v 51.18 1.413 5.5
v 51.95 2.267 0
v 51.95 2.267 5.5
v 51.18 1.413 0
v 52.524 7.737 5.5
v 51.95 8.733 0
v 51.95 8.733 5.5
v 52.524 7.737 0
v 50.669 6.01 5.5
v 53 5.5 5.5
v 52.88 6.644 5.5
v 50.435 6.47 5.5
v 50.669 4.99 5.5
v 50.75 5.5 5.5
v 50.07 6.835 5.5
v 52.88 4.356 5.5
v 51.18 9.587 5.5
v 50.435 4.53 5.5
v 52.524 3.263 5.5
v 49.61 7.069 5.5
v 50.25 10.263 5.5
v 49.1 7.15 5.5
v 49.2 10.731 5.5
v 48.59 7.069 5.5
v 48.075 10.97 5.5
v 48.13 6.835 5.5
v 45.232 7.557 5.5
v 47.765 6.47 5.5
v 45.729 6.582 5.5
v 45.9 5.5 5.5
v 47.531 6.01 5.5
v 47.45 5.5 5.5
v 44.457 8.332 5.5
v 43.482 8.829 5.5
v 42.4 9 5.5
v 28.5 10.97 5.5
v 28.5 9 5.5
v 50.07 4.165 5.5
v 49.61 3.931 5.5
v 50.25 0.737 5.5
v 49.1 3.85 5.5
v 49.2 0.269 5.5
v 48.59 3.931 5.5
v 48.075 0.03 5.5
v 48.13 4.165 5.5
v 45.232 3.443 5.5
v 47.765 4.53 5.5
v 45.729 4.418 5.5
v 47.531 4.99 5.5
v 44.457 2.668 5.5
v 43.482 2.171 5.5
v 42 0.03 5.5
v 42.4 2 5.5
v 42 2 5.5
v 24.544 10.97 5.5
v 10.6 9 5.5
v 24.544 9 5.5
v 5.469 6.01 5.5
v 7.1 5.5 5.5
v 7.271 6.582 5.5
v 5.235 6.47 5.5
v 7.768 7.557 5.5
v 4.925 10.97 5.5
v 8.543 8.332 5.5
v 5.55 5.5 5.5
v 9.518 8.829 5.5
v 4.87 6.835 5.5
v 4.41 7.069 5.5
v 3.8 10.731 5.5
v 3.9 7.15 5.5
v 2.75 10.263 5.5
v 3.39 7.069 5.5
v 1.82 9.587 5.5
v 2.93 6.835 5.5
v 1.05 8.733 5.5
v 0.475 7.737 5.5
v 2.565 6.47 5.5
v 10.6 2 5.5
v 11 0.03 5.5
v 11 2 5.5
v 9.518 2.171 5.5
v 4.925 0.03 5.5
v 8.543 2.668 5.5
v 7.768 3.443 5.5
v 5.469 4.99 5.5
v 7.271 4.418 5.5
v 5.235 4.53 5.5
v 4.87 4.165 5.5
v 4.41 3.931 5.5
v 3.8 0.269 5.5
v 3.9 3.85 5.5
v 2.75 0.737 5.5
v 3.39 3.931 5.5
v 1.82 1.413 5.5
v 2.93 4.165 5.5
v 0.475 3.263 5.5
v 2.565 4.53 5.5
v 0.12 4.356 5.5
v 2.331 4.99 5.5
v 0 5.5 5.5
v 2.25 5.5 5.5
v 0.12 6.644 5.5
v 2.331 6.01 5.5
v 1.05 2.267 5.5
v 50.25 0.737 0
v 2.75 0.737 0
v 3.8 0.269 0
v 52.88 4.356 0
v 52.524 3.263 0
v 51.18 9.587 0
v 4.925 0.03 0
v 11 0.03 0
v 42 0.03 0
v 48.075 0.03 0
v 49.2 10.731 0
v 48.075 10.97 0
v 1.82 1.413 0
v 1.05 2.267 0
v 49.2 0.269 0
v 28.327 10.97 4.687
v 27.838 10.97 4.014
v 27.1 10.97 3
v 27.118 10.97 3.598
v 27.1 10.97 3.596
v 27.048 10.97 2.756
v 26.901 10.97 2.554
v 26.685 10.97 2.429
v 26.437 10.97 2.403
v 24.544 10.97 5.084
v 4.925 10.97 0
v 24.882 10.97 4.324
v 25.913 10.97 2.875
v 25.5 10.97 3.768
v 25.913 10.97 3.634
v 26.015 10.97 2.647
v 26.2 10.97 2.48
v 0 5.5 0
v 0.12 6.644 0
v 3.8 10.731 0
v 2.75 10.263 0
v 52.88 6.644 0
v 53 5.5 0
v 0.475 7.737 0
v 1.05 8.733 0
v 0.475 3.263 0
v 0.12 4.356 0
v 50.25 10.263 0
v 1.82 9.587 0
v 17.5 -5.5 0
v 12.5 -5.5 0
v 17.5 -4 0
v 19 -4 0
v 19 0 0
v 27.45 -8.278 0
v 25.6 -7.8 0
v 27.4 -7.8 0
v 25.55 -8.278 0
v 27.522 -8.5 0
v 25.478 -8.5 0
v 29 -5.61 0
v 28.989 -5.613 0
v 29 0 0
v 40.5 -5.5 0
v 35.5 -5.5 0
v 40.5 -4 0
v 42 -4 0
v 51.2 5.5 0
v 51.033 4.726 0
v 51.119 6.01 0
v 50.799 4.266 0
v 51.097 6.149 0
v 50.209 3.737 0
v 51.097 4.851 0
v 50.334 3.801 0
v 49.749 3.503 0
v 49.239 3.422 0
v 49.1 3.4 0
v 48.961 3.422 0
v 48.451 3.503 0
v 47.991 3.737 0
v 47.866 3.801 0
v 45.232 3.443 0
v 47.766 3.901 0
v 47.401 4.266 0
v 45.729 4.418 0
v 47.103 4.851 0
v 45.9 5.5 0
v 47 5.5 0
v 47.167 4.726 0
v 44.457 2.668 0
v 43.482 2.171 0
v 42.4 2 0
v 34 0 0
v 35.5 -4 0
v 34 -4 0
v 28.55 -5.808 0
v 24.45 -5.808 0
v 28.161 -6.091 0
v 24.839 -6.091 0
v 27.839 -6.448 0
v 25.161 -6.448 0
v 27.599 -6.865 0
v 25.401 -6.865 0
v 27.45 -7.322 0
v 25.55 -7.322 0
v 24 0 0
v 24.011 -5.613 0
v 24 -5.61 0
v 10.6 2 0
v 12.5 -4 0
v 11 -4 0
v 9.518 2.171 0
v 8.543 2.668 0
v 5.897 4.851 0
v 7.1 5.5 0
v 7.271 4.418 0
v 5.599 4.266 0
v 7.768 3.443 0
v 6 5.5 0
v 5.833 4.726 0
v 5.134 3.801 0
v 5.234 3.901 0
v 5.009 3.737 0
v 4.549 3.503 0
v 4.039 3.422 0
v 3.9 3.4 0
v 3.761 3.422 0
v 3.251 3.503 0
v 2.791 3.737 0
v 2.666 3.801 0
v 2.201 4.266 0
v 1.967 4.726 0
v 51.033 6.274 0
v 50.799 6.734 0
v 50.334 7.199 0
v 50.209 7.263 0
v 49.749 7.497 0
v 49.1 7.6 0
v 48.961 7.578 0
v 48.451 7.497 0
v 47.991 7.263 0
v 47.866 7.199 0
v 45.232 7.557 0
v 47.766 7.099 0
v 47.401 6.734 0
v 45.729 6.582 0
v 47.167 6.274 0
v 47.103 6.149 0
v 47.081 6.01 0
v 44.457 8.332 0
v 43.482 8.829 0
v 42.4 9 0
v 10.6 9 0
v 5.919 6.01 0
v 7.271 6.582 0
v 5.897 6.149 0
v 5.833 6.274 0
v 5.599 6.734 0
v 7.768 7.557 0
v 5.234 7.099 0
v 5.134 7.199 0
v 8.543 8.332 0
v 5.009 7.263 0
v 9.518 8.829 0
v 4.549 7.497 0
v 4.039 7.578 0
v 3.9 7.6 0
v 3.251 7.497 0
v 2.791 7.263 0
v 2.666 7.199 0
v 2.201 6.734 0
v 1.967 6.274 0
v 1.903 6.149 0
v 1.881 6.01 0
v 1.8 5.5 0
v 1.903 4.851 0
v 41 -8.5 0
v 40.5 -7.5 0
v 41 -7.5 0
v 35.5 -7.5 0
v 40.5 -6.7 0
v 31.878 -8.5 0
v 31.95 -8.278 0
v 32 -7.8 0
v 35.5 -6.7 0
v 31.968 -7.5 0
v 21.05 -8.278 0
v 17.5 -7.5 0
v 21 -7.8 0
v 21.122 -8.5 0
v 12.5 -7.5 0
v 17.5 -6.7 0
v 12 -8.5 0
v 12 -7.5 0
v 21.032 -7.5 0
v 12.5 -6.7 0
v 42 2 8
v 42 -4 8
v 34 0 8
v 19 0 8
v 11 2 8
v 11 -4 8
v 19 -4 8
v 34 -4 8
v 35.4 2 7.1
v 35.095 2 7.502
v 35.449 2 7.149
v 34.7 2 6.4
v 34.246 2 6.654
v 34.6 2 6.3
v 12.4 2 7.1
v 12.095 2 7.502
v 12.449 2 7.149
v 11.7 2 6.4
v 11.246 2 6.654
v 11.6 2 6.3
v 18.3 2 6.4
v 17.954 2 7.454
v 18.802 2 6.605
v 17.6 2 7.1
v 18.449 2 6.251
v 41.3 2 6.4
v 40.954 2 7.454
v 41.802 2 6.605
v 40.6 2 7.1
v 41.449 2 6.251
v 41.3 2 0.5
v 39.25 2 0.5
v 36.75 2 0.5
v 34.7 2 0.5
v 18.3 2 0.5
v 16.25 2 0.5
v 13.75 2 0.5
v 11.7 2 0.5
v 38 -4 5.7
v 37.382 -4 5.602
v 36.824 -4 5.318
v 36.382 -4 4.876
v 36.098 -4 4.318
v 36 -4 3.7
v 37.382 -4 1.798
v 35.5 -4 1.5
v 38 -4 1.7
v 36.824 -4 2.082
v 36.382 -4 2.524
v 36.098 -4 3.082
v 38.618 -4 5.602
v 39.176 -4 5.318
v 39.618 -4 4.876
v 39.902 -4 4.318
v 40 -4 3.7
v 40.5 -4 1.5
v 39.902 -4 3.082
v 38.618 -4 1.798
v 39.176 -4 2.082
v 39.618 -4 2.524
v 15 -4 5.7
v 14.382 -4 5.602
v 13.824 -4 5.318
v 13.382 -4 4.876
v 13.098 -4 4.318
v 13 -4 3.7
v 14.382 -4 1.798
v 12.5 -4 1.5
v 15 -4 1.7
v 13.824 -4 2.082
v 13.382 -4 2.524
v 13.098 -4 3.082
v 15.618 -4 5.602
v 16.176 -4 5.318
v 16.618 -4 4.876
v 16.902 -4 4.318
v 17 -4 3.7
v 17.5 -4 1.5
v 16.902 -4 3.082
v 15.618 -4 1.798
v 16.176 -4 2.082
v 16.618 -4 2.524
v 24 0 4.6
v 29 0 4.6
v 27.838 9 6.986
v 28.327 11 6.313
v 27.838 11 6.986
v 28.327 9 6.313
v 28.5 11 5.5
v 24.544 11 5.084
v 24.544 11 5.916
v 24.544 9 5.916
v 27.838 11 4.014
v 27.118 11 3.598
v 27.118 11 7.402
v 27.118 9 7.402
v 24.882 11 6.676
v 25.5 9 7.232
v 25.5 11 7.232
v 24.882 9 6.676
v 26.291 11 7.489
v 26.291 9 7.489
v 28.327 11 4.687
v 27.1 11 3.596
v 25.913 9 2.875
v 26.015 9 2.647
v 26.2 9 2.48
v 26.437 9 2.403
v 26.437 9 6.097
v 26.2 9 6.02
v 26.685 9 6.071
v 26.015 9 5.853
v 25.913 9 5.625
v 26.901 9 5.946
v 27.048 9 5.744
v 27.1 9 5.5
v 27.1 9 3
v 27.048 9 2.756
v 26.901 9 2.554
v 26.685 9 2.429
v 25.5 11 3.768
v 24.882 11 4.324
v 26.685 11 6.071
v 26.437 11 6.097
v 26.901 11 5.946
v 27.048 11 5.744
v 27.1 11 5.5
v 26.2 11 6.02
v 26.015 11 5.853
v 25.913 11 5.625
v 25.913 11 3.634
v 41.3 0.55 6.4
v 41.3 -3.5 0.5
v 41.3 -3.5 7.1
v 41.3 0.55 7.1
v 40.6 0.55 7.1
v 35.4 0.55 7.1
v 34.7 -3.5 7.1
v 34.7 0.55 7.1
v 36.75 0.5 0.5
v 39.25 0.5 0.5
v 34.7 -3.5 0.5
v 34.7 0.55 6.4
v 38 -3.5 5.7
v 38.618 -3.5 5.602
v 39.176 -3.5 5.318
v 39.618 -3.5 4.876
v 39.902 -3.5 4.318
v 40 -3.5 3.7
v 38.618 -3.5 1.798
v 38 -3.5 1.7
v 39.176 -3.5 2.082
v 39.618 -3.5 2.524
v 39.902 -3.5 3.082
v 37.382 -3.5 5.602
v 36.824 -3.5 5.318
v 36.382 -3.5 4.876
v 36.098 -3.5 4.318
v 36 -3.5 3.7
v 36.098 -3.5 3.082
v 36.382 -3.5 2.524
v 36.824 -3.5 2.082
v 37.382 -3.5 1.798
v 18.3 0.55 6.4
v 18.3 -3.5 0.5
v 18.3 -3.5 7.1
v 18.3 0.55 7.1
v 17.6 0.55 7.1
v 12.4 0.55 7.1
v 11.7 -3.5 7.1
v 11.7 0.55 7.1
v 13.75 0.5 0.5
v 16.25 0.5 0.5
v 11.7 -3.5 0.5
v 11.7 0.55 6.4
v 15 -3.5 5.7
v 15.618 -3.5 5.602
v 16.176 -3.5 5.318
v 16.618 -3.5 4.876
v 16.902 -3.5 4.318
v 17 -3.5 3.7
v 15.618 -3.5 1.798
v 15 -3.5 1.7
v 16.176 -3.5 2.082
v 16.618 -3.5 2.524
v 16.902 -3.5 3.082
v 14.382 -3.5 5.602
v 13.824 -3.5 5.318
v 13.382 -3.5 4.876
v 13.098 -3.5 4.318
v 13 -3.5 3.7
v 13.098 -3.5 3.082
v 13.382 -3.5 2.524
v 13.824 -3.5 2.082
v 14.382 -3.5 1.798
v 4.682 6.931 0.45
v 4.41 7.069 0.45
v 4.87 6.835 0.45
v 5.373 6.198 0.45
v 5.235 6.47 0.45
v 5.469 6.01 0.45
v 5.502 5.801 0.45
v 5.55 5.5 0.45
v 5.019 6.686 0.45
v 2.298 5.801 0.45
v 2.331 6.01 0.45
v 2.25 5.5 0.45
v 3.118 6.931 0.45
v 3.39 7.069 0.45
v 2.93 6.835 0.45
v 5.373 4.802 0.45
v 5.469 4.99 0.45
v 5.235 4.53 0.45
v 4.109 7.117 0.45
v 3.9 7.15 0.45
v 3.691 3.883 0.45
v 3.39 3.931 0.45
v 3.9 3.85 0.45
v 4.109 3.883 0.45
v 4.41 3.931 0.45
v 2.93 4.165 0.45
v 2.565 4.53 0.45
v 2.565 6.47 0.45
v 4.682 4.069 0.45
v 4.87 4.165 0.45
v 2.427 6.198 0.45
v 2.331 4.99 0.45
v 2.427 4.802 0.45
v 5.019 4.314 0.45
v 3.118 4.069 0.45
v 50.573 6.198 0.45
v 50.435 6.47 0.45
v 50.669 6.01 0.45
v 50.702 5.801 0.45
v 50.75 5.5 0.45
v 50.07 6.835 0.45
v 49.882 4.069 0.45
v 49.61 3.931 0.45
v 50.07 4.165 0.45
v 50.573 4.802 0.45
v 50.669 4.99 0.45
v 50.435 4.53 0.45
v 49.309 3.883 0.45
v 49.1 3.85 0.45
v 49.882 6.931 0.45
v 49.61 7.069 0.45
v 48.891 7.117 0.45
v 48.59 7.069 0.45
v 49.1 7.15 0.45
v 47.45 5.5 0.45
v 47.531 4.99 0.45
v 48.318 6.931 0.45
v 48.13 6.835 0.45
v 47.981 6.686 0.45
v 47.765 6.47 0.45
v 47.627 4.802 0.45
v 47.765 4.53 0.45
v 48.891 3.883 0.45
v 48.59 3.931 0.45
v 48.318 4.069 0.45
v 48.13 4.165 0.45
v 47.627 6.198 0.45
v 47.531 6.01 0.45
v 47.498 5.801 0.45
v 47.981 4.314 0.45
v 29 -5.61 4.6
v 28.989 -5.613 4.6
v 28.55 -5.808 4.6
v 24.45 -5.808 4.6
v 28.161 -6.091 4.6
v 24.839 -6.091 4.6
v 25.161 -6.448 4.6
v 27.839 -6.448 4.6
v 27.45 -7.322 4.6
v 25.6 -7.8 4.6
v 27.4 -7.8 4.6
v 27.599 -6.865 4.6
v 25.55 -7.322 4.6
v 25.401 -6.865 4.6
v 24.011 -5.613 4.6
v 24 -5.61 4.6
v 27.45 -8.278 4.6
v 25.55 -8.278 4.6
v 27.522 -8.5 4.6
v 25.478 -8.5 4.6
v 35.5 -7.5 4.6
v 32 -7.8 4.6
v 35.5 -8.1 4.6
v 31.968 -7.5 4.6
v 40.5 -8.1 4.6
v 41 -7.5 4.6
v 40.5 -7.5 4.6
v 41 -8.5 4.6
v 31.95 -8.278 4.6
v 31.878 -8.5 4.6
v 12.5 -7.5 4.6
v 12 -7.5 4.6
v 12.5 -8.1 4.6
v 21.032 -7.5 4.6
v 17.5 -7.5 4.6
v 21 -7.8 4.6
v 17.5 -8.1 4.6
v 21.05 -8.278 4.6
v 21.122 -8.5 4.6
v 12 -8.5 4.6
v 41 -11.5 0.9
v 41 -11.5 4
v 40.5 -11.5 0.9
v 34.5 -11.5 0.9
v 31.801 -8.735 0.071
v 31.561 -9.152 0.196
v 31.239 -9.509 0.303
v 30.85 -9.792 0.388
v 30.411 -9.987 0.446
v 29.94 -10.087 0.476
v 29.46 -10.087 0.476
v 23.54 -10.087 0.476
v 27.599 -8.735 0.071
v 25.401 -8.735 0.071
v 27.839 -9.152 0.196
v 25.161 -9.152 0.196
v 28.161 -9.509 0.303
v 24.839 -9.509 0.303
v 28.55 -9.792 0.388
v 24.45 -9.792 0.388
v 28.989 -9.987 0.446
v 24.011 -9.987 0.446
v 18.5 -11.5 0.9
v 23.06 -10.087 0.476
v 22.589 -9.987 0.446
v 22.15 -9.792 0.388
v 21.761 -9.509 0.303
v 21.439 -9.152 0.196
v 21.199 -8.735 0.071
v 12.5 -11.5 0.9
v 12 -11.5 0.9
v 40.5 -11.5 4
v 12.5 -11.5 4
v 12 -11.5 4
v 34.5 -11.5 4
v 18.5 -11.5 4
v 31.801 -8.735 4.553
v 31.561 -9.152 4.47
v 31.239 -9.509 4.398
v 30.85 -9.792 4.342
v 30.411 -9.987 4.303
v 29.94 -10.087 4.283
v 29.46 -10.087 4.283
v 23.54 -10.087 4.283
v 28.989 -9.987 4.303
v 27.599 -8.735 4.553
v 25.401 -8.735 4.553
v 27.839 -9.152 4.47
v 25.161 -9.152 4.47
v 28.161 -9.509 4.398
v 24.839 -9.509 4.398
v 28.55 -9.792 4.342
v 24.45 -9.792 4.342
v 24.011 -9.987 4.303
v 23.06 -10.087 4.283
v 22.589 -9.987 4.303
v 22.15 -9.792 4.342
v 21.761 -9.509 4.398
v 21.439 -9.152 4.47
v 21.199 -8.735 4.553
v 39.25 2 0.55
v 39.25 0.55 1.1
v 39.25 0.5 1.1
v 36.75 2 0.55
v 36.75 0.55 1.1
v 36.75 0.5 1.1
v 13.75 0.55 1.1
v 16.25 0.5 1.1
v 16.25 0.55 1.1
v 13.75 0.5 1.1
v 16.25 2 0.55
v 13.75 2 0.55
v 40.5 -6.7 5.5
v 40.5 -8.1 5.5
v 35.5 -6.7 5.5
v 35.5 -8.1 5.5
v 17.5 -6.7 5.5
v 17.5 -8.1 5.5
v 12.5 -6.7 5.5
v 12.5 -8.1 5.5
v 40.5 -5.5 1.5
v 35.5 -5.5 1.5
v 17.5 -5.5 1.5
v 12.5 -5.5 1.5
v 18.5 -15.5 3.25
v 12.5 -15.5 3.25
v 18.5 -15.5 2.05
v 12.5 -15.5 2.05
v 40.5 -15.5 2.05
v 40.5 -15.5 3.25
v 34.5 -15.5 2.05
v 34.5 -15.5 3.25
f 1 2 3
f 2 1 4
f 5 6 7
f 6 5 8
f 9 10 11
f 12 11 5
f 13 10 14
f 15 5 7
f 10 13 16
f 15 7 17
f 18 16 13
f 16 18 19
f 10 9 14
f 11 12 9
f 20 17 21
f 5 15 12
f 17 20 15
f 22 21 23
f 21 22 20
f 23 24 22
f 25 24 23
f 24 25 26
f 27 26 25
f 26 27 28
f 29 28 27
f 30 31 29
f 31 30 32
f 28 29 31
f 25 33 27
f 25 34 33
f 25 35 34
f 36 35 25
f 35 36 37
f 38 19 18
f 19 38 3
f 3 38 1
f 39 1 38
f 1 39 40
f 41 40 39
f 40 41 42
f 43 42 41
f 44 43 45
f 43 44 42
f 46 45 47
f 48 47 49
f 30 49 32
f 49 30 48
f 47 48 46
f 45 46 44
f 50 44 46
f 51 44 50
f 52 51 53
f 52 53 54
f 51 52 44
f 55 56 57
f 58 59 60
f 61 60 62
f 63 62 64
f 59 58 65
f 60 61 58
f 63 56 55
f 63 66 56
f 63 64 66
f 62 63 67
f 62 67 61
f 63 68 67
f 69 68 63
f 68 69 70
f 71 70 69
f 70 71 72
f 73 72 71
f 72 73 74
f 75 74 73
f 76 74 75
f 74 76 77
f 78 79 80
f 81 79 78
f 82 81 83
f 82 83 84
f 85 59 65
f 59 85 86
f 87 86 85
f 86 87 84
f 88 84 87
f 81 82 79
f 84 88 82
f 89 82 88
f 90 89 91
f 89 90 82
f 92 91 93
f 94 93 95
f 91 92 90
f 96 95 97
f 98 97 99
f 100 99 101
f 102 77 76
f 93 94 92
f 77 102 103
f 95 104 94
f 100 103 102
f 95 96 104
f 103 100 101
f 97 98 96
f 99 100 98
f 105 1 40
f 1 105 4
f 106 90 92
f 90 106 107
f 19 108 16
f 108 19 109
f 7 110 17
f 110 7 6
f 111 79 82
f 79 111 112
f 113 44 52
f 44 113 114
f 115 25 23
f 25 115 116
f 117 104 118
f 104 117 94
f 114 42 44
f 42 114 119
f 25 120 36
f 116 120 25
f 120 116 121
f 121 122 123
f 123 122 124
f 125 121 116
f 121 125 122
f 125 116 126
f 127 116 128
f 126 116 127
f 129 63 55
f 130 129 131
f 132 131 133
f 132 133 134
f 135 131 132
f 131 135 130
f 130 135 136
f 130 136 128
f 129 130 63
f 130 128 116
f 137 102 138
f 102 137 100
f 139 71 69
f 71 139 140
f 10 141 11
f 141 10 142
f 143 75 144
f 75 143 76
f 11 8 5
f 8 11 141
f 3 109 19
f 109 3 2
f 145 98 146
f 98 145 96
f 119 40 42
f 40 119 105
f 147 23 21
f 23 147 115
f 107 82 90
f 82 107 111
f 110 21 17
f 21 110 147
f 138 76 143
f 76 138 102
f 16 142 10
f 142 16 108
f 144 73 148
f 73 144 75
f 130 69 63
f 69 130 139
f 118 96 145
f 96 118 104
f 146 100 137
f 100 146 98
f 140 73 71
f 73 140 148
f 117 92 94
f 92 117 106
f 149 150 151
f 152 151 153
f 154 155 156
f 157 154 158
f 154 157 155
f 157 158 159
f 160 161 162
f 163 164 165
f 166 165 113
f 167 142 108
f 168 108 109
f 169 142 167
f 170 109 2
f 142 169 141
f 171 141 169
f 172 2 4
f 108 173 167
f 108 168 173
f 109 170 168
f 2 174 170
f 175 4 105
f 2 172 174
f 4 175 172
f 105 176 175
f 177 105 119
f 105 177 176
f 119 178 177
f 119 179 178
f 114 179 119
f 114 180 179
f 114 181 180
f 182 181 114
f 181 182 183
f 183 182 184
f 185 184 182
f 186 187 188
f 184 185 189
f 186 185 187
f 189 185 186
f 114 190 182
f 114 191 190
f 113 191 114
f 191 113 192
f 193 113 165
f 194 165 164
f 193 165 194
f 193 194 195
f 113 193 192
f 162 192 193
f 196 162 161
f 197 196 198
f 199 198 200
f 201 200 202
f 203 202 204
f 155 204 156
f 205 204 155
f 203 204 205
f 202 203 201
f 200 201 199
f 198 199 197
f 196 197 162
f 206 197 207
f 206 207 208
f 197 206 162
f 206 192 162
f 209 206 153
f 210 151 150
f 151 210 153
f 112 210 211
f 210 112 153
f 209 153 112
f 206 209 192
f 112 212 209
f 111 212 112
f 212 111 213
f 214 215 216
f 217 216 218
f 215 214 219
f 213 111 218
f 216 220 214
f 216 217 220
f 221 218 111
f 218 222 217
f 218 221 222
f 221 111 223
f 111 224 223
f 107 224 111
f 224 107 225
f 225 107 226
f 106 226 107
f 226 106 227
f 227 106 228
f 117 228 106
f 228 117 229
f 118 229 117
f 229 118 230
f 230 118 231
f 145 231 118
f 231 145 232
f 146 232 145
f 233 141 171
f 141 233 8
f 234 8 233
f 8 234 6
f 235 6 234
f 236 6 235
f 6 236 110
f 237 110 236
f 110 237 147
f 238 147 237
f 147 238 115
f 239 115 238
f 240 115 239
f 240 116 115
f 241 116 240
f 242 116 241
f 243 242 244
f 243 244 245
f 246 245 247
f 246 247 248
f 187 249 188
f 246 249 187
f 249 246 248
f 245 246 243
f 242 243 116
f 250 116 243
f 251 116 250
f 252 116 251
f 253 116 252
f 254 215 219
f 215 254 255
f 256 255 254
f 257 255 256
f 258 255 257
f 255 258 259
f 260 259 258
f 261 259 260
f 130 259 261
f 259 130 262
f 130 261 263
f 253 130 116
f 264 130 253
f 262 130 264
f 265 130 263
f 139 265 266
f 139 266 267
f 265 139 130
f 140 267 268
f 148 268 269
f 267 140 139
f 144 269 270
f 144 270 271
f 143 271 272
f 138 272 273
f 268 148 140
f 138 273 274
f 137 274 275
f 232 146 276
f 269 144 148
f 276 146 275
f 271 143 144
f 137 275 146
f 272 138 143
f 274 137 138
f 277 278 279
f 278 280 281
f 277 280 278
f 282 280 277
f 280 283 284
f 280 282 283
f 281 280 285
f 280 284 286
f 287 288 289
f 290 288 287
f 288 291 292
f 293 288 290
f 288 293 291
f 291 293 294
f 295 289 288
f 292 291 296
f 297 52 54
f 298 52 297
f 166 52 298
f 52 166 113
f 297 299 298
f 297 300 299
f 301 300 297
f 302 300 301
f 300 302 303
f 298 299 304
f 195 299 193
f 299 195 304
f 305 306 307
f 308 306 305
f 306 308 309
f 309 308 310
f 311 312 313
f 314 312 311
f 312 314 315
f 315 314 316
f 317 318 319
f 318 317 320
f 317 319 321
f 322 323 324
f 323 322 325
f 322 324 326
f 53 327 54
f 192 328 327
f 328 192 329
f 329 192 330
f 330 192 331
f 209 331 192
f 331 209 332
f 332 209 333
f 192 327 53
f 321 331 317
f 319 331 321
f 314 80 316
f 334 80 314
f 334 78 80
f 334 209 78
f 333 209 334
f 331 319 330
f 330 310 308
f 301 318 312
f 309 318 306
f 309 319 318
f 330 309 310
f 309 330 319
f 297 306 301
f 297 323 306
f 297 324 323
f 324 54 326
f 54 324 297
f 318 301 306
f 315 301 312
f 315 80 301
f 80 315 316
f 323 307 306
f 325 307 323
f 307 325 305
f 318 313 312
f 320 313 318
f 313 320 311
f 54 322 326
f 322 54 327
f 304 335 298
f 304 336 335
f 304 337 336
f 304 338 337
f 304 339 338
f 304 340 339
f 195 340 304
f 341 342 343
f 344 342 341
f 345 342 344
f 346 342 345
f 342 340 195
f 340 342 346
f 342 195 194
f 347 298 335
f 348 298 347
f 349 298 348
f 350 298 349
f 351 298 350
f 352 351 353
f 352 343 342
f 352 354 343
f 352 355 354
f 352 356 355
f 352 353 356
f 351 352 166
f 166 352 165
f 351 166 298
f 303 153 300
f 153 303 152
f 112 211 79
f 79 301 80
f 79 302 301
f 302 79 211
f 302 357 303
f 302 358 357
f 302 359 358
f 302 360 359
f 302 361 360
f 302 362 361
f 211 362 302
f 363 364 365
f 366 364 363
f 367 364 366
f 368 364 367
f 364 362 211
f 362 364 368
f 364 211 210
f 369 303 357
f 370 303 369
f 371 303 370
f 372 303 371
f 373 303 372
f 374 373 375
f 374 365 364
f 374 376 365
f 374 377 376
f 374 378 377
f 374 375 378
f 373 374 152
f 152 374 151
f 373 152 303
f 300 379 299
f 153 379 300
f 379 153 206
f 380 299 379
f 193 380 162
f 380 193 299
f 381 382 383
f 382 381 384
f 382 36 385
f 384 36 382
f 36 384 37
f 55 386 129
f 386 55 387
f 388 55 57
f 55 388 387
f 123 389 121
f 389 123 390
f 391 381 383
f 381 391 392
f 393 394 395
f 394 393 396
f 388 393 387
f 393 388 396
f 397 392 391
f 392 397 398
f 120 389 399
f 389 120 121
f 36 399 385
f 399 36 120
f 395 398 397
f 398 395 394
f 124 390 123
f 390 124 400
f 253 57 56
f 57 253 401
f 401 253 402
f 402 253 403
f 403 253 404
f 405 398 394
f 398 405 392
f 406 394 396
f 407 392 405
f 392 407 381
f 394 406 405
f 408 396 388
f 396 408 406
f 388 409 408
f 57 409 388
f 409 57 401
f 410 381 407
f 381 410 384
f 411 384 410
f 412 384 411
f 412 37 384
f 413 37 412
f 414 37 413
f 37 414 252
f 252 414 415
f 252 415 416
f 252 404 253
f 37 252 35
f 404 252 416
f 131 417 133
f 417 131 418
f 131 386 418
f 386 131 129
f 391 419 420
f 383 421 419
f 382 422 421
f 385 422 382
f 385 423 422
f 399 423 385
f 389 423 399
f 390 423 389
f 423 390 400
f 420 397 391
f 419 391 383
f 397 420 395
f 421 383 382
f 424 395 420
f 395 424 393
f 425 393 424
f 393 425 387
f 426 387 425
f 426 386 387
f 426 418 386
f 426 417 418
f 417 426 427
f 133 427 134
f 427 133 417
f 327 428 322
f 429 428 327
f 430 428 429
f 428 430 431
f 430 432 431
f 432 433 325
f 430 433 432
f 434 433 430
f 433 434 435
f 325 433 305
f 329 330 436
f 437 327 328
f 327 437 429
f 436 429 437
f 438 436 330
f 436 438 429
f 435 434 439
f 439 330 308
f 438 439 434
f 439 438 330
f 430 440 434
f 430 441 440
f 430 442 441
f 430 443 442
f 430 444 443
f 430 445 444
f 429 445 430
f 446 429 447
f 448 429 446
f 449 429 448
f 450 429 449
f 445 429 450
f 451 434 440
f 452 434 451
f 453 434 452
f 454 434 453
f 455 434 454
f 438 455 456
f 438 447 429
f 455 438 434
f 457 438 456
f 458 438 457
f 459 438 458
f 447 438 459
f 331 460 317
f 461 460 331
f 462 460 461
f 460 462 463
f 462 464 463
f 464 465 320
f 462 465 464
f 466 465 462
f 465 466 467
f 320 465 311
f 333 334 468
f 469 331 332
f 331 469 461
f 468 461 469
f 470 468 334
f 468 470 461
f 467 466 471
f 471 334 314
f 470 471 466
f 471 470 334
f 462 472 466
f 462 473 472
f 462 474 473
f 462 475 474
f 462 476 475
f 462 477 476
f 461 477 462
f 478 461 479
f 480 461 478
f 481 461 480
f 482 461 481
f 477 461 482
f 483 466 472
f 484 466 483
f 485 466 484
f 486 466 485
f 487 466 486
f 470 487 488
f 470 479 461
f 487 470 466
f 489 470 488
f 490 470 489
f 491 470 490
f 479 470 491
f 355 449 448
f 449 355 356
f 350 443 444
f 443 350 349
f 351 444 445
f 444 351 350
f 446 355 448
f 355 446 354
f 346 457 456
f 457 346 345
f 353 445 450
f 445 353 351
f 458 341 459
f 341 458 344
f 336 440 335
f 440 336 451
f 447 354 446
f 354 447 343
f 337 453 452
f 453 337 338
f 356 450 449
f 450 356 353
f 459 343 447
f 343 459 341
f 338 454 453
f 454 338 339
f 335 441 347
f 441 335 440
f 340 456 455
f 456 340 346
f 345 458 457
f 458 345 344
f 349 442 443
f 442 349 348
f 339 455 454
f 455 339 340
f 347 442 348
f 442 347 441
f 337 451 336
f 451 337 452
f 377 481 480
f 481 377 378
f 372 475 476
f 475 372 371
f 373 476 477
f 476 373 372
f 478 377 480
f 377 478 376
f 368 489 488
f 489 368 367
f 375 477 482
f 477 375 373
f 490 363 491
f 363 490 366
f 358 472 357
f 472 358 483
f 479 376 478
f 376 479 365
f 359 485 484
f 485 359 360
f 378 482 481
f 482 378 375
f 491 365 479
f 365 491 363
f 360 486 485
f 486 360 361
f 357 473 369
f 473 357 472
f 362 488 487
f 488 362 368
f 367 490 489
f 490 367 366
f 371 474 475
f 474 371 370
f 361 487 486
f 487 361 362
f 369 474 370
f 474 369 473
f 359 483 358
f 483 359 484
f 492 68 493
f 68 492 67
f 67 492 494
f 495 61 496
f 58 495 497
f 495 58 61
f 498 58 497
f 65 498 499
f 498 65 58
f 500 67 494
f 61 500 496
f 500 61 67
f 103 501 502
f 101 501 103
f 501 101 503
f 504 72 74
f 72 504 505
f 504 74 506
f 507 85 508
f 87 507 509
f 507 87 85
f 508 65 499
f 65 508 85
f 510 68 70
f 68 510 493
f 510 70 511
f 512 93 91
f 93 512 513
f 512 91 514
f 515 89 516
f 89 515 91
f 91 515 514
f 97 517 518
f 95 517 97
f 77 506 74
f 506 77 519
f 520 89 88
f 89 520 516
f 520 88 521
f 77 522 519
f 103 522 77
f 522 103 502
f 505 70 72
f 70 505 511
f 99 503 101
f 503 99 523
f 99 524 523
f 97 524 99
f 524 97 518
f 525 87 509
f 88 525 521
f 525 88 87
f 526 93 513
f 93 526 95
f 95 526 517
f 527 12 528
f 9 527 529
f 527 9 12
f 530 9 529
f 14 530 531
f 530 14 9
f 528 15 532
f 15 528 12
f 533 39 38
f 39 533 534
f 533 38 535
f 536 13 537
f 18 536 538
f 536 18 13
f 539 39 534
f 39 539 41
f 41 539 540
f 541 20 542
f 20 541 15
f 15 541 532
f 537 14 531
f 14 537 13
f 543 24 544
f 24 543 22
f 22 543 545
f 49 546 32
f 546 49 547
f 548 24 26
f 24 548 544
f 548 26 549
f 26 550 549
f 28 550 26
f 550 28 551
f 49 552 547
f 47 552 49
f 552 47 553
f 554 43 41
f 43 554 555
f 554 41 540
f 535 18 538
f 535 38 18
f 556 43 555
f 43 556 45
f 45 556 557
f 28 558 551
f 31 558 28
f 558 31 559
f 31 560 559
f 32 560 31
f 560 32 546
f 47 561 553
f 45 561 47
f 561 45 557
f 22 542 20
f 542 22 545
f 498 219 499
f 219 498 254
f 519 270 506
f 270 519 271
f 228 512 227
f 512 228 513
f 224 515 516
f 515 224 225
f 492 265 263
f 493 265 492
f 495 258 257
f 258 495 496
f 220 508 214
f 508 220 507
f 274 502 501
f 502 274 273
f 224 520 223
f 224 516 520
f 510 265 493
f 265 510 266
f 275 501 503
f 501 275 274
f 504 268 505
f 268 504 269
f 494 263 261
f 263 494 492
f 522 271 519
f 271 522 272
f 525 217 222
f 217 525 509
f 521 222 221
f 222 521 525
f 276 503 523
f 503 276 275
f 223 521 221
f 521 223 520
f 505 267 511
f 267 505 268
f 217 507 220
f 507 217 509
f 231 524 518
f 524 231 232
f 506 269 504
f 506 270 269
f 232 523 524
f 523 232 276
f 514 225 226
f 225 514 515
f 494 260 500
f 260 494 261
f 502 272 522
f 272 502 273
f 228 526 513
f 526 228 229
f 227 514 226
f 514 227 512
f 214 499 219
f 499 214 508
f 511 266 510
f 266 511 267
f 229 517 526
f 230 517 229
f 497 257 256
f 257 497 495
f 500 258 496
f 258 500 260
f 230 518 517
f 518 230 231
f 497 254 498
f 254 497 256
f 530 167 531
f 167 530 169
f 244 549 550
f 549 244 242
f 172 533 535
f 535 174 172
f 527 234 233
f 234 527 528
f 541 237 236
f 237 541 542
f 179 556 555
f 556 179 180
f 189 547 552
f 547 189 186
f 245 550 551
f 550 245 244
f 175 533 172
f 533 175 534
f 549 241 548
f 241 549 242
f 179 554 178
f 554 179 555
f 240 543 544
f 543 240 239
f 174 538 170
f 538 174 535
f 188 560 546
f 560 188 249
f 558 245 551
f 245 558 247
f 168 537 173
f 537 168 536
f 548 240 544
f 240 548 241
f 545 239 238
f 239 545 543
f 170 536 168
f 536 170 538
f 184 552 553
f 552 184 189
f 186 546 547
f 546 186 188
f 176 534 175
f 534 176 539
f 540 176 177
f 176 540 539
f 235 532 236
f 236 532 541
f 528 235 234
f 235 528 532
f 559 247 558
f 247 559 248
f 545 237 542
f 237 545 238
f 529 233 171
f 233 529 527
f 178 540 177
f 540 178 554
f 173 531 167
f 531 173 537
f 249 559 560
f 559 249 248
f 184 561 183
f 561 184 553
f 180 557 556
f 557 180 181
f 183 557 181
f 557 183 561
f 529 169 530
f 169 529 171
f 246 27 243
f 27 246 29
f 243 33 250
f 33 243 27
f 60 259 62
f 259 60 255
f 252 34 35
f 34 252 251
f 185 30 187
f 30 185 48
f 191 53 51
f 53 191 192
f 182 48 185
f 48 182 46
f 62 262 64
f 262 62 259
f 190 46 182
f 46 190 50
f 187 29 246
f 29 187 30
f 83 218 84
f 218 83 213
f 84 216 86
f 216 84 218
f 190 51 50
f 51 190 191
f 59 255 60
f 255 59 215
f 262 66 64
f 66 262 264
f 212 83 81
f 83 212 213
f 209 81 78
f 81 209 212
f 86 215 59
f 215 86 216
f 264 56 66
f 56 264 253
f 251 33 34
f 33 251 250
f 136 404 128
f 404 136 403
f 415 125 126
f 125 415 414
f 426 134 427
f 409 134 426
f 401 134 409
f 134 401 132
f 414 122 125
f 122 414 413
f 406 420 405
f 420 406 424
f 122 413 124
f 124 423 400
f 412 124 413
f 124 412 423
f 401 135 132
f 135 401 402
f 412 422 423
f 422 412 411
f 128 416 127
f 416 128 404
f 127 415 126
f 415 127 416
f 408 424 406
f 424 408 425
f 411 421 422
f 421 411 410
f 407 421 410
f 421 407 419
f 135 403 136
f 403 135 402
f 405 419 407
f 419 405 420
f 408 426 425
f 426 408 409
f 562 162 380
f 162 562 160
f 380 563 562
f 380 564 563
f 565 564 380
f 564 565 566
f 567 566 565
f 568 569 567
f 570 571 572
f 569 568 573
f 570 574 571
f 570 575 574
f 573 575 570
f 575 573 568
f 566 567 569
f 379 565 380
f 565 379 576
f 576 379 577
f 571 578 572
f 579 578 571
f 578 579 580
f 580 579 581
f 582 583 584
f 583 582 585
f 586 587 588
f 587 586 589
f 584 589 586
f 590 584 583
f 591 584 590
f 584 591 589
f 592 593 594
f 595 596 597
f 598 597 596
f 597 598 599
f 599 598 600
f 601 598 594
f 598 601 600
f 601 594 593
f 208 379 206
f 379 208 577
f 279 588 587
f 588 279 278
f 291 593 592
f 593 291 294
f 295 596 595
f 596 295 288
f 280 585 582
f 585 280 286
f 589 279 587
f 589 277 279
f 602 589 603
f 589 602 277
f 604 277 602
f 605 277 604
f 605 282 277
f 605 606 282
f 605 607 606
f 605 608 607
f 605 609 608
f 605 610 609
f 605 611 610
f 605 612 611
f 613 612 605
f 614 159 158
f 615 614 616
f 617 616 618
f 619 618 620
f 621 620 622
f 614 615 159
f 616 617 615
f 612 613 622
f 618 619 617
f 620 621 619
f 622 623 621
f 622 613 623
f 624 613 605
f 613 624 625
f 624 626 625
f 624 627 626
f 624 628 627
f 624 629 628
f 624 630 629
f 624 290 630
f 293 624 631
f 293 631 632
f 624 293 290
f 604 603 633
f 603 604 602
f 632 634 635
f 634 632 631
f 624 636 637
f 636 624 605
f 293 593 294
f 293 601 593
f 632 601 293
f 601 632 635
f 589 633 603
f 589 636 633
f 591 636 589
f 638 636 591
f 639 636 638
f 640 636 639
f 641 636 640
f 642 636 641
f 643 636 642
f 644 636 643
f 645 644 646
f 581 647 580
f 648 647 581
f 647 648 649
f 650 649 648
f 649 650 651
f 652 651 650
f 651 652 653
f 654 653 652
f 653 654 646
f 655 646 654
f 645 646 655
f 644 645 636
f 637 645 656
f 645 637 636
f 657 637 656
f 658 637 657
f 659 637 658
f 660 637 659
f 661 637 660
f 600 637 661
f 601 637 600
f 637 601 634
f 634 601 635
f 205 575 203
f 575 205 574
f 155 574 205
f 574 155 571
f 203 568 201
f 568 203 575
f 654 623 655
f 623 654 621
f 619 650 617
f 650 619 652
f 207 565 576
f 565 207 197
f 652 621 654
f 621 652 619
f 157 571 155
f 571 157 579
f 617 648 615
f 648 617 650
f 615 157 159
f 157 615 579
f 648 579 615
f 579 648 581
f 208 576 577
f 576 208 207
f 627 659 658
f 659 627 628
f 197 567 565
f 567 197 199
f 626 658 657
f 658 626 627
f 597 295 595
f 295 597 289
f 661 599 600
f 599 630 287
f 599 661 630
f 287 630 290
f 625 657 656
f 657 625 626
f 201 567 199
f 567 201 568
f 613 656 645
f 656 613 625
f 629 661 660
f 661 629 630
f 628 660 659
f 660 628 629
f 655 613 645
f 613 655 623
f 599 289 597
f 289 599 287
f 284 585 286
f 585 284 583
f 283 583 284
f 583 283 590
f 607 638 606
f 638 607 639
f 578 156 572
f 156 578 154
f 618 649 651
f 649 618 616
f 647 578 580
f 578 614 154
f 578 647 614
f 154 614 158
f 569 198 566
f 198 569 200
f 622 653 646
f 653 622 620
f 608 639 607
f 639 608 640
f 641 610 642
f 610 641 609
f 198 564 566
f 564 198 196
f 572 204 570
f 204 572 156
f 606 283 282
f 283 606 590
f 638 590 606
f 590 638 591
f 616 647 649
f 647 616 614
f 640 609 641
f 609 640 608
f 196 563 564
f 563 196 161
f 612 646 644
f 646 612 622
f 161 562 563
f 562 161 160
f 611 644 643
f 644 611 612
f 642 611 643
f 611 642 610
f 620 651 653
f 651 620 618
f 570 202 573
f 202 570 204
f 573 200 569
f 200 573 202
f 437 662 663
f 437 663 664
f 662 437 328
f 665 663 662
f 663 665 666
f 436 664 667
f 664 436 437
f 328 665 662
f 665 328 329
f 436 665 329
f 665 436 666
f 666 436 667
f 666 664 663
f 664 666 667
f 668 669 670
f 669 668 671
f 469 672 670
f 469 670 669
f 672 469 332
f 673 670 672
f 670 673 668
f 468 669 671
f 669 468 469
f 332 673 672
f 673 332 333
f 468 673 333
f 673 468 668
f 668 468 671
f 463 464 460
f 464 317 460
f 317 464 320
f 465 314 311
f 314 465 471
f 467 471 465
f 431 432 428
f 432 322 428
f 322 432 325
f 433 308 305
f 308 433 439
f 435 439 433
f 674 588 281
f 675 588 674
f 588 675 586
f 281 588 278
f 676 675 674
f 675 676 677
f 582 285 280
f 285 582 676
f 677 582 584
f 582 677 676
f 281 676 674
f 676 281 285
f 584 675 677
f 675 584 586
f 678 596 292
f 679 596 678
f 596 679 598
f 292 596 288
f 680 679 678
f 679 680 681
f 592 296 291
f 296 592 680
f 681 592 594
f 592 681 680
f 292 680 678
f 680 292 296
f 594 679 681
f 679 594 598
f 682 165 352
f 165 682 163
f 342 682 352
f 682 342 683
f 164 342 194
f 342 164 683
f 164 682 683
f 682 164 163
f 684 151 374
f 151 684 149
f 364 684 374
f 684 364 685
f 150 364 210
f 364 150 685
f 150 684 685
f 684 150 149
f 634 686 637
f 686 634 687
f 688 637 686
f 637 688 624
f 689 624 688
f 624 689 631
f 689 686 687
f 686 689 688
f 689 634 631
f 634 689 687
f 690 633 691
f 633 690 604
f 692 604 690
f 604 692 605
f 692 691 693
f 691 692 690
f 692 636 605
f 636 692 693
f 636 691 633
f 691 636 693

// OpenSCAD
//**************************************************
//*  Trim button block to retrofit into MPX Profi transmitter gimbal 
//*  28.11.2014 Henning Stoecklein - free for noncemmercial use
//**************************************************

// Show ghost objects?
ghost = 0 ; // [0:No ghosts, 1:Show additional objects]

// Make cable holder?
cable_holder = 1 ; // [0:No holder, 1:Make cable holder hole]

// Basic gimbal adapter dimension X
blx = 53 ;

// Basic gimbal adapter dimension Y
blh = 5.5;

// Trim lever button knob width
trimx = 6; // [4:8]

// Trim lever button knob height
knob_height = 1.2 ;

// Trim button travel restriction block height
travel = 5.5 ;

// Trim lever height (don't change)
trimy = 8.5;

// Microswitch fixation snap height
snap_height = 0.6 ;

// Cutout radius for integrated lever hinge (2.2 = hard, 2.6 = soft)
hinge_cutout = 2.3;

stegx = 29 ;
bspc  = 6.6 ;

// Trimmerblock
module 9xr_trimmer()
{
	// Basisblock
   difference() {
     union()
     {
		 hull() {
		   translate ([5.5,5.5,0]) cylinder (r=5.5, h=blh, $fn=30) ;
		   translate ([blx-5.5,5.5,0]) cylinder (r=5.5, h=blh, $fn=30) ;
		 }

        // Fixing blocks for Micro switches
        translate ([38-8/2,-4,0]) cube ([8, 6, 8]);
        translate ([15-8/2,-4,0]) cube ([8, 6, 8]);
        
         // Bar in between
        translate ([(blx-30)/2,0,0]) cube ([30, 2, 8]);
         
        // Cable holder
        if (cable_holder == 1)
           translate ([blx/2,11,blh]) rotate ([90,0,0]) cylinder (r=2, h=2, $fn=15);
     }

	  // 4-edge-holes and holes for micro switch
     translate ([38-bspc/2,-3.5,0.5]) cube ([bspc, 8, bspc]);
     translate ([15-bspc/2,-3.5,0.5]) cube ([bspc, 8, bspc]);
     translate ([38,4,3.7]) rotate ([90,0,0]) cylinder (r=2, h=10, $fn=20);
     translate ([15,4,3.7]) rotate ([90,0,0]) cylinder (r=2, h=10, $fn=20);

	  // Screw holes
     translate ([(blx-45.2)/2,5.5,-0.1]) cylinder (r=3.3/2, h=6, $fn=20) ;
     translate ([(blx-45.2)/2+45.2,5.5,-0.1]) cylinder (r=3.3/2, h=6, $fn=20);

	  // Chamfers 
     translate ([(blx-45.2)/2,5.5,-0.9]) cylinder (r1=3, r2=1, h=2, $fn=20);
     translate ([(blx-45.2)/2+45.2,5.5,-0.9]) cylinder (r1=3, r2=1, h=2, $fn=20);
		
	  // Big long hole 
     hull() 
     {
       translate ([blx*0.2,5.5,-0.1]) cylinder (r=3.5, h=10, $fn=20);
       translate ([blx*0.8,5.5,-0.1]) cylinder (r=3.5, h=10, $fn=20);
     }

     // Hole in cable holder if required 
     if (cable_holder ==1) 
        hull() 
        {
	       translate ([blx/2,12,blh]) rotate ([90,0,0]) cylinder (r=0.6, h=4, $fn=15);
	       translate ([blx/2,12,blh-2.5]) rotate ([90,0,0]) cylinder (r=0.6, h=4, $fn=15);
	     }
   }
 
   // Ramp clips for Snap-in switch fixation
   hull() {
	  translate ([38-2.5/2,0.5,0.5]) cube ([2.5, 0.05, snap_height]);
	  translate ([38-2.5/2,1.95,0.5]) cube ([2.5, 0.05, 0.05]);
   }
   hull() {
	  translate ([15-2.5/2,0.5,0.5]) cube ([2.5, 0.05, snap_height]);
	  translate ([15-2.5/2,1.95,0.5]) cube ([2.5, 0.05, 0.05]);
   }

	// Clips for switch fixation
   translate ([15+2.6,0.55,bspc+0.5]) rotate ([0,45,0]) cube ([1.2, 1.45, 0.5]);
   translate ([15+3.2-bspc,0.55,bspc-0.3]) rotate ([0,-45,0]) #cube ([1.2, 1.45, 0.5]);
   translate ([38+2.6,0.55,bspc+0.5]) rotate ([0,45,0]) #cube ([1.2, 1.45, 0.5]);
   translate ([38+3.2-bspc,0.55,bspc-0.3]) rotate ([0,-45,0]) #cube ([1.2, 1.45, 0.5]);
 
	// Operation Lever
   translate ([38-5/2,-8.1,0]) cube ([5, 1.4, 5.5]) ;
   translate ([15-5/2,-8.1,0]) cube ([5, 1.4, 5.5]) ;

 	// End block to constrain lever travel
   translate ([38-5/2,-travel,0]) cube ([5, 1.5, 1.5]) ;
   translate ([15-5/2,-travel,0]) cube ([5, 1.5, 1.5]) ;

   // Hole for hinge
   difference() 
   {
     union() {
       translate ([(blx-5)/2,-8,0]) cube ([5, 8, 4.6]) ;		// Hinge block

       // Connecting rod between 2 trim switches
       hull() {
			translate ([(blx-stegx)/2,-trimy,0]) cube ([stegx, 1, 4.6]) ;
     		translate ([(blx-stegx)/2,-trimy-3,0.9]) cube ([stegx, 0.5, 3.1]) ;
		 }
     }
 
     translate ([blx/2-3.2,-7.8,-0.1]) cylinder (r=hinge_cutout, h=10, $fn=30);
     translate ([blx/2+3.2,-7.8,-0.1]) cylinder (r=hinge_cutout, h=10, $fn=30);
   }

   // Trim button (Prism)
   hull() {
     translate ([1+(blx-30)/2,-trimy-3,(blh-3.7)/2]) cube ([trimx, 0.1, 3.1]) ;
     translate ([1+(blx-30)/2,-trimy-7,(blh-1.4)/2]) cube ([trimx, 0.1, knob_height]) ;
   }
   hull() {
     translate ([(blx-30)/2+29-trimx,-trimy-3,(blh-3.7)/2]) cube ([trimx, 1, 3.1]) ;
     translate ([(blx-30)/2+29-trimx,-trimy-7,(blh-1.4)/2]) cube ([trimx, 1, knob_height]) ;
   }
}

module smd_taster()
{
   cube ([5, 5, 1.2], center=true) ;
   translate ([0,0,0.2]) cylinder (r=1, h=1.5, $fn=20, center=true) ;
}

module taster()
{
   cube ([6.2, 6.2, 3.5], center=true) ;
   translate ([0,0,1.6]) cylinder (r=3.4/2, h=6.7, $fn=20, center=true) ;
}

9xr_trimmer() ;

if (ghost == 1)
{
  rotate ([90,0,0]) translate ([(blx-23)/2-0,3.5]) %taster() ;
  rotate ([90,0,0]) translate ([(blx+23)/2+0,3.5]) %taster() ;
}
